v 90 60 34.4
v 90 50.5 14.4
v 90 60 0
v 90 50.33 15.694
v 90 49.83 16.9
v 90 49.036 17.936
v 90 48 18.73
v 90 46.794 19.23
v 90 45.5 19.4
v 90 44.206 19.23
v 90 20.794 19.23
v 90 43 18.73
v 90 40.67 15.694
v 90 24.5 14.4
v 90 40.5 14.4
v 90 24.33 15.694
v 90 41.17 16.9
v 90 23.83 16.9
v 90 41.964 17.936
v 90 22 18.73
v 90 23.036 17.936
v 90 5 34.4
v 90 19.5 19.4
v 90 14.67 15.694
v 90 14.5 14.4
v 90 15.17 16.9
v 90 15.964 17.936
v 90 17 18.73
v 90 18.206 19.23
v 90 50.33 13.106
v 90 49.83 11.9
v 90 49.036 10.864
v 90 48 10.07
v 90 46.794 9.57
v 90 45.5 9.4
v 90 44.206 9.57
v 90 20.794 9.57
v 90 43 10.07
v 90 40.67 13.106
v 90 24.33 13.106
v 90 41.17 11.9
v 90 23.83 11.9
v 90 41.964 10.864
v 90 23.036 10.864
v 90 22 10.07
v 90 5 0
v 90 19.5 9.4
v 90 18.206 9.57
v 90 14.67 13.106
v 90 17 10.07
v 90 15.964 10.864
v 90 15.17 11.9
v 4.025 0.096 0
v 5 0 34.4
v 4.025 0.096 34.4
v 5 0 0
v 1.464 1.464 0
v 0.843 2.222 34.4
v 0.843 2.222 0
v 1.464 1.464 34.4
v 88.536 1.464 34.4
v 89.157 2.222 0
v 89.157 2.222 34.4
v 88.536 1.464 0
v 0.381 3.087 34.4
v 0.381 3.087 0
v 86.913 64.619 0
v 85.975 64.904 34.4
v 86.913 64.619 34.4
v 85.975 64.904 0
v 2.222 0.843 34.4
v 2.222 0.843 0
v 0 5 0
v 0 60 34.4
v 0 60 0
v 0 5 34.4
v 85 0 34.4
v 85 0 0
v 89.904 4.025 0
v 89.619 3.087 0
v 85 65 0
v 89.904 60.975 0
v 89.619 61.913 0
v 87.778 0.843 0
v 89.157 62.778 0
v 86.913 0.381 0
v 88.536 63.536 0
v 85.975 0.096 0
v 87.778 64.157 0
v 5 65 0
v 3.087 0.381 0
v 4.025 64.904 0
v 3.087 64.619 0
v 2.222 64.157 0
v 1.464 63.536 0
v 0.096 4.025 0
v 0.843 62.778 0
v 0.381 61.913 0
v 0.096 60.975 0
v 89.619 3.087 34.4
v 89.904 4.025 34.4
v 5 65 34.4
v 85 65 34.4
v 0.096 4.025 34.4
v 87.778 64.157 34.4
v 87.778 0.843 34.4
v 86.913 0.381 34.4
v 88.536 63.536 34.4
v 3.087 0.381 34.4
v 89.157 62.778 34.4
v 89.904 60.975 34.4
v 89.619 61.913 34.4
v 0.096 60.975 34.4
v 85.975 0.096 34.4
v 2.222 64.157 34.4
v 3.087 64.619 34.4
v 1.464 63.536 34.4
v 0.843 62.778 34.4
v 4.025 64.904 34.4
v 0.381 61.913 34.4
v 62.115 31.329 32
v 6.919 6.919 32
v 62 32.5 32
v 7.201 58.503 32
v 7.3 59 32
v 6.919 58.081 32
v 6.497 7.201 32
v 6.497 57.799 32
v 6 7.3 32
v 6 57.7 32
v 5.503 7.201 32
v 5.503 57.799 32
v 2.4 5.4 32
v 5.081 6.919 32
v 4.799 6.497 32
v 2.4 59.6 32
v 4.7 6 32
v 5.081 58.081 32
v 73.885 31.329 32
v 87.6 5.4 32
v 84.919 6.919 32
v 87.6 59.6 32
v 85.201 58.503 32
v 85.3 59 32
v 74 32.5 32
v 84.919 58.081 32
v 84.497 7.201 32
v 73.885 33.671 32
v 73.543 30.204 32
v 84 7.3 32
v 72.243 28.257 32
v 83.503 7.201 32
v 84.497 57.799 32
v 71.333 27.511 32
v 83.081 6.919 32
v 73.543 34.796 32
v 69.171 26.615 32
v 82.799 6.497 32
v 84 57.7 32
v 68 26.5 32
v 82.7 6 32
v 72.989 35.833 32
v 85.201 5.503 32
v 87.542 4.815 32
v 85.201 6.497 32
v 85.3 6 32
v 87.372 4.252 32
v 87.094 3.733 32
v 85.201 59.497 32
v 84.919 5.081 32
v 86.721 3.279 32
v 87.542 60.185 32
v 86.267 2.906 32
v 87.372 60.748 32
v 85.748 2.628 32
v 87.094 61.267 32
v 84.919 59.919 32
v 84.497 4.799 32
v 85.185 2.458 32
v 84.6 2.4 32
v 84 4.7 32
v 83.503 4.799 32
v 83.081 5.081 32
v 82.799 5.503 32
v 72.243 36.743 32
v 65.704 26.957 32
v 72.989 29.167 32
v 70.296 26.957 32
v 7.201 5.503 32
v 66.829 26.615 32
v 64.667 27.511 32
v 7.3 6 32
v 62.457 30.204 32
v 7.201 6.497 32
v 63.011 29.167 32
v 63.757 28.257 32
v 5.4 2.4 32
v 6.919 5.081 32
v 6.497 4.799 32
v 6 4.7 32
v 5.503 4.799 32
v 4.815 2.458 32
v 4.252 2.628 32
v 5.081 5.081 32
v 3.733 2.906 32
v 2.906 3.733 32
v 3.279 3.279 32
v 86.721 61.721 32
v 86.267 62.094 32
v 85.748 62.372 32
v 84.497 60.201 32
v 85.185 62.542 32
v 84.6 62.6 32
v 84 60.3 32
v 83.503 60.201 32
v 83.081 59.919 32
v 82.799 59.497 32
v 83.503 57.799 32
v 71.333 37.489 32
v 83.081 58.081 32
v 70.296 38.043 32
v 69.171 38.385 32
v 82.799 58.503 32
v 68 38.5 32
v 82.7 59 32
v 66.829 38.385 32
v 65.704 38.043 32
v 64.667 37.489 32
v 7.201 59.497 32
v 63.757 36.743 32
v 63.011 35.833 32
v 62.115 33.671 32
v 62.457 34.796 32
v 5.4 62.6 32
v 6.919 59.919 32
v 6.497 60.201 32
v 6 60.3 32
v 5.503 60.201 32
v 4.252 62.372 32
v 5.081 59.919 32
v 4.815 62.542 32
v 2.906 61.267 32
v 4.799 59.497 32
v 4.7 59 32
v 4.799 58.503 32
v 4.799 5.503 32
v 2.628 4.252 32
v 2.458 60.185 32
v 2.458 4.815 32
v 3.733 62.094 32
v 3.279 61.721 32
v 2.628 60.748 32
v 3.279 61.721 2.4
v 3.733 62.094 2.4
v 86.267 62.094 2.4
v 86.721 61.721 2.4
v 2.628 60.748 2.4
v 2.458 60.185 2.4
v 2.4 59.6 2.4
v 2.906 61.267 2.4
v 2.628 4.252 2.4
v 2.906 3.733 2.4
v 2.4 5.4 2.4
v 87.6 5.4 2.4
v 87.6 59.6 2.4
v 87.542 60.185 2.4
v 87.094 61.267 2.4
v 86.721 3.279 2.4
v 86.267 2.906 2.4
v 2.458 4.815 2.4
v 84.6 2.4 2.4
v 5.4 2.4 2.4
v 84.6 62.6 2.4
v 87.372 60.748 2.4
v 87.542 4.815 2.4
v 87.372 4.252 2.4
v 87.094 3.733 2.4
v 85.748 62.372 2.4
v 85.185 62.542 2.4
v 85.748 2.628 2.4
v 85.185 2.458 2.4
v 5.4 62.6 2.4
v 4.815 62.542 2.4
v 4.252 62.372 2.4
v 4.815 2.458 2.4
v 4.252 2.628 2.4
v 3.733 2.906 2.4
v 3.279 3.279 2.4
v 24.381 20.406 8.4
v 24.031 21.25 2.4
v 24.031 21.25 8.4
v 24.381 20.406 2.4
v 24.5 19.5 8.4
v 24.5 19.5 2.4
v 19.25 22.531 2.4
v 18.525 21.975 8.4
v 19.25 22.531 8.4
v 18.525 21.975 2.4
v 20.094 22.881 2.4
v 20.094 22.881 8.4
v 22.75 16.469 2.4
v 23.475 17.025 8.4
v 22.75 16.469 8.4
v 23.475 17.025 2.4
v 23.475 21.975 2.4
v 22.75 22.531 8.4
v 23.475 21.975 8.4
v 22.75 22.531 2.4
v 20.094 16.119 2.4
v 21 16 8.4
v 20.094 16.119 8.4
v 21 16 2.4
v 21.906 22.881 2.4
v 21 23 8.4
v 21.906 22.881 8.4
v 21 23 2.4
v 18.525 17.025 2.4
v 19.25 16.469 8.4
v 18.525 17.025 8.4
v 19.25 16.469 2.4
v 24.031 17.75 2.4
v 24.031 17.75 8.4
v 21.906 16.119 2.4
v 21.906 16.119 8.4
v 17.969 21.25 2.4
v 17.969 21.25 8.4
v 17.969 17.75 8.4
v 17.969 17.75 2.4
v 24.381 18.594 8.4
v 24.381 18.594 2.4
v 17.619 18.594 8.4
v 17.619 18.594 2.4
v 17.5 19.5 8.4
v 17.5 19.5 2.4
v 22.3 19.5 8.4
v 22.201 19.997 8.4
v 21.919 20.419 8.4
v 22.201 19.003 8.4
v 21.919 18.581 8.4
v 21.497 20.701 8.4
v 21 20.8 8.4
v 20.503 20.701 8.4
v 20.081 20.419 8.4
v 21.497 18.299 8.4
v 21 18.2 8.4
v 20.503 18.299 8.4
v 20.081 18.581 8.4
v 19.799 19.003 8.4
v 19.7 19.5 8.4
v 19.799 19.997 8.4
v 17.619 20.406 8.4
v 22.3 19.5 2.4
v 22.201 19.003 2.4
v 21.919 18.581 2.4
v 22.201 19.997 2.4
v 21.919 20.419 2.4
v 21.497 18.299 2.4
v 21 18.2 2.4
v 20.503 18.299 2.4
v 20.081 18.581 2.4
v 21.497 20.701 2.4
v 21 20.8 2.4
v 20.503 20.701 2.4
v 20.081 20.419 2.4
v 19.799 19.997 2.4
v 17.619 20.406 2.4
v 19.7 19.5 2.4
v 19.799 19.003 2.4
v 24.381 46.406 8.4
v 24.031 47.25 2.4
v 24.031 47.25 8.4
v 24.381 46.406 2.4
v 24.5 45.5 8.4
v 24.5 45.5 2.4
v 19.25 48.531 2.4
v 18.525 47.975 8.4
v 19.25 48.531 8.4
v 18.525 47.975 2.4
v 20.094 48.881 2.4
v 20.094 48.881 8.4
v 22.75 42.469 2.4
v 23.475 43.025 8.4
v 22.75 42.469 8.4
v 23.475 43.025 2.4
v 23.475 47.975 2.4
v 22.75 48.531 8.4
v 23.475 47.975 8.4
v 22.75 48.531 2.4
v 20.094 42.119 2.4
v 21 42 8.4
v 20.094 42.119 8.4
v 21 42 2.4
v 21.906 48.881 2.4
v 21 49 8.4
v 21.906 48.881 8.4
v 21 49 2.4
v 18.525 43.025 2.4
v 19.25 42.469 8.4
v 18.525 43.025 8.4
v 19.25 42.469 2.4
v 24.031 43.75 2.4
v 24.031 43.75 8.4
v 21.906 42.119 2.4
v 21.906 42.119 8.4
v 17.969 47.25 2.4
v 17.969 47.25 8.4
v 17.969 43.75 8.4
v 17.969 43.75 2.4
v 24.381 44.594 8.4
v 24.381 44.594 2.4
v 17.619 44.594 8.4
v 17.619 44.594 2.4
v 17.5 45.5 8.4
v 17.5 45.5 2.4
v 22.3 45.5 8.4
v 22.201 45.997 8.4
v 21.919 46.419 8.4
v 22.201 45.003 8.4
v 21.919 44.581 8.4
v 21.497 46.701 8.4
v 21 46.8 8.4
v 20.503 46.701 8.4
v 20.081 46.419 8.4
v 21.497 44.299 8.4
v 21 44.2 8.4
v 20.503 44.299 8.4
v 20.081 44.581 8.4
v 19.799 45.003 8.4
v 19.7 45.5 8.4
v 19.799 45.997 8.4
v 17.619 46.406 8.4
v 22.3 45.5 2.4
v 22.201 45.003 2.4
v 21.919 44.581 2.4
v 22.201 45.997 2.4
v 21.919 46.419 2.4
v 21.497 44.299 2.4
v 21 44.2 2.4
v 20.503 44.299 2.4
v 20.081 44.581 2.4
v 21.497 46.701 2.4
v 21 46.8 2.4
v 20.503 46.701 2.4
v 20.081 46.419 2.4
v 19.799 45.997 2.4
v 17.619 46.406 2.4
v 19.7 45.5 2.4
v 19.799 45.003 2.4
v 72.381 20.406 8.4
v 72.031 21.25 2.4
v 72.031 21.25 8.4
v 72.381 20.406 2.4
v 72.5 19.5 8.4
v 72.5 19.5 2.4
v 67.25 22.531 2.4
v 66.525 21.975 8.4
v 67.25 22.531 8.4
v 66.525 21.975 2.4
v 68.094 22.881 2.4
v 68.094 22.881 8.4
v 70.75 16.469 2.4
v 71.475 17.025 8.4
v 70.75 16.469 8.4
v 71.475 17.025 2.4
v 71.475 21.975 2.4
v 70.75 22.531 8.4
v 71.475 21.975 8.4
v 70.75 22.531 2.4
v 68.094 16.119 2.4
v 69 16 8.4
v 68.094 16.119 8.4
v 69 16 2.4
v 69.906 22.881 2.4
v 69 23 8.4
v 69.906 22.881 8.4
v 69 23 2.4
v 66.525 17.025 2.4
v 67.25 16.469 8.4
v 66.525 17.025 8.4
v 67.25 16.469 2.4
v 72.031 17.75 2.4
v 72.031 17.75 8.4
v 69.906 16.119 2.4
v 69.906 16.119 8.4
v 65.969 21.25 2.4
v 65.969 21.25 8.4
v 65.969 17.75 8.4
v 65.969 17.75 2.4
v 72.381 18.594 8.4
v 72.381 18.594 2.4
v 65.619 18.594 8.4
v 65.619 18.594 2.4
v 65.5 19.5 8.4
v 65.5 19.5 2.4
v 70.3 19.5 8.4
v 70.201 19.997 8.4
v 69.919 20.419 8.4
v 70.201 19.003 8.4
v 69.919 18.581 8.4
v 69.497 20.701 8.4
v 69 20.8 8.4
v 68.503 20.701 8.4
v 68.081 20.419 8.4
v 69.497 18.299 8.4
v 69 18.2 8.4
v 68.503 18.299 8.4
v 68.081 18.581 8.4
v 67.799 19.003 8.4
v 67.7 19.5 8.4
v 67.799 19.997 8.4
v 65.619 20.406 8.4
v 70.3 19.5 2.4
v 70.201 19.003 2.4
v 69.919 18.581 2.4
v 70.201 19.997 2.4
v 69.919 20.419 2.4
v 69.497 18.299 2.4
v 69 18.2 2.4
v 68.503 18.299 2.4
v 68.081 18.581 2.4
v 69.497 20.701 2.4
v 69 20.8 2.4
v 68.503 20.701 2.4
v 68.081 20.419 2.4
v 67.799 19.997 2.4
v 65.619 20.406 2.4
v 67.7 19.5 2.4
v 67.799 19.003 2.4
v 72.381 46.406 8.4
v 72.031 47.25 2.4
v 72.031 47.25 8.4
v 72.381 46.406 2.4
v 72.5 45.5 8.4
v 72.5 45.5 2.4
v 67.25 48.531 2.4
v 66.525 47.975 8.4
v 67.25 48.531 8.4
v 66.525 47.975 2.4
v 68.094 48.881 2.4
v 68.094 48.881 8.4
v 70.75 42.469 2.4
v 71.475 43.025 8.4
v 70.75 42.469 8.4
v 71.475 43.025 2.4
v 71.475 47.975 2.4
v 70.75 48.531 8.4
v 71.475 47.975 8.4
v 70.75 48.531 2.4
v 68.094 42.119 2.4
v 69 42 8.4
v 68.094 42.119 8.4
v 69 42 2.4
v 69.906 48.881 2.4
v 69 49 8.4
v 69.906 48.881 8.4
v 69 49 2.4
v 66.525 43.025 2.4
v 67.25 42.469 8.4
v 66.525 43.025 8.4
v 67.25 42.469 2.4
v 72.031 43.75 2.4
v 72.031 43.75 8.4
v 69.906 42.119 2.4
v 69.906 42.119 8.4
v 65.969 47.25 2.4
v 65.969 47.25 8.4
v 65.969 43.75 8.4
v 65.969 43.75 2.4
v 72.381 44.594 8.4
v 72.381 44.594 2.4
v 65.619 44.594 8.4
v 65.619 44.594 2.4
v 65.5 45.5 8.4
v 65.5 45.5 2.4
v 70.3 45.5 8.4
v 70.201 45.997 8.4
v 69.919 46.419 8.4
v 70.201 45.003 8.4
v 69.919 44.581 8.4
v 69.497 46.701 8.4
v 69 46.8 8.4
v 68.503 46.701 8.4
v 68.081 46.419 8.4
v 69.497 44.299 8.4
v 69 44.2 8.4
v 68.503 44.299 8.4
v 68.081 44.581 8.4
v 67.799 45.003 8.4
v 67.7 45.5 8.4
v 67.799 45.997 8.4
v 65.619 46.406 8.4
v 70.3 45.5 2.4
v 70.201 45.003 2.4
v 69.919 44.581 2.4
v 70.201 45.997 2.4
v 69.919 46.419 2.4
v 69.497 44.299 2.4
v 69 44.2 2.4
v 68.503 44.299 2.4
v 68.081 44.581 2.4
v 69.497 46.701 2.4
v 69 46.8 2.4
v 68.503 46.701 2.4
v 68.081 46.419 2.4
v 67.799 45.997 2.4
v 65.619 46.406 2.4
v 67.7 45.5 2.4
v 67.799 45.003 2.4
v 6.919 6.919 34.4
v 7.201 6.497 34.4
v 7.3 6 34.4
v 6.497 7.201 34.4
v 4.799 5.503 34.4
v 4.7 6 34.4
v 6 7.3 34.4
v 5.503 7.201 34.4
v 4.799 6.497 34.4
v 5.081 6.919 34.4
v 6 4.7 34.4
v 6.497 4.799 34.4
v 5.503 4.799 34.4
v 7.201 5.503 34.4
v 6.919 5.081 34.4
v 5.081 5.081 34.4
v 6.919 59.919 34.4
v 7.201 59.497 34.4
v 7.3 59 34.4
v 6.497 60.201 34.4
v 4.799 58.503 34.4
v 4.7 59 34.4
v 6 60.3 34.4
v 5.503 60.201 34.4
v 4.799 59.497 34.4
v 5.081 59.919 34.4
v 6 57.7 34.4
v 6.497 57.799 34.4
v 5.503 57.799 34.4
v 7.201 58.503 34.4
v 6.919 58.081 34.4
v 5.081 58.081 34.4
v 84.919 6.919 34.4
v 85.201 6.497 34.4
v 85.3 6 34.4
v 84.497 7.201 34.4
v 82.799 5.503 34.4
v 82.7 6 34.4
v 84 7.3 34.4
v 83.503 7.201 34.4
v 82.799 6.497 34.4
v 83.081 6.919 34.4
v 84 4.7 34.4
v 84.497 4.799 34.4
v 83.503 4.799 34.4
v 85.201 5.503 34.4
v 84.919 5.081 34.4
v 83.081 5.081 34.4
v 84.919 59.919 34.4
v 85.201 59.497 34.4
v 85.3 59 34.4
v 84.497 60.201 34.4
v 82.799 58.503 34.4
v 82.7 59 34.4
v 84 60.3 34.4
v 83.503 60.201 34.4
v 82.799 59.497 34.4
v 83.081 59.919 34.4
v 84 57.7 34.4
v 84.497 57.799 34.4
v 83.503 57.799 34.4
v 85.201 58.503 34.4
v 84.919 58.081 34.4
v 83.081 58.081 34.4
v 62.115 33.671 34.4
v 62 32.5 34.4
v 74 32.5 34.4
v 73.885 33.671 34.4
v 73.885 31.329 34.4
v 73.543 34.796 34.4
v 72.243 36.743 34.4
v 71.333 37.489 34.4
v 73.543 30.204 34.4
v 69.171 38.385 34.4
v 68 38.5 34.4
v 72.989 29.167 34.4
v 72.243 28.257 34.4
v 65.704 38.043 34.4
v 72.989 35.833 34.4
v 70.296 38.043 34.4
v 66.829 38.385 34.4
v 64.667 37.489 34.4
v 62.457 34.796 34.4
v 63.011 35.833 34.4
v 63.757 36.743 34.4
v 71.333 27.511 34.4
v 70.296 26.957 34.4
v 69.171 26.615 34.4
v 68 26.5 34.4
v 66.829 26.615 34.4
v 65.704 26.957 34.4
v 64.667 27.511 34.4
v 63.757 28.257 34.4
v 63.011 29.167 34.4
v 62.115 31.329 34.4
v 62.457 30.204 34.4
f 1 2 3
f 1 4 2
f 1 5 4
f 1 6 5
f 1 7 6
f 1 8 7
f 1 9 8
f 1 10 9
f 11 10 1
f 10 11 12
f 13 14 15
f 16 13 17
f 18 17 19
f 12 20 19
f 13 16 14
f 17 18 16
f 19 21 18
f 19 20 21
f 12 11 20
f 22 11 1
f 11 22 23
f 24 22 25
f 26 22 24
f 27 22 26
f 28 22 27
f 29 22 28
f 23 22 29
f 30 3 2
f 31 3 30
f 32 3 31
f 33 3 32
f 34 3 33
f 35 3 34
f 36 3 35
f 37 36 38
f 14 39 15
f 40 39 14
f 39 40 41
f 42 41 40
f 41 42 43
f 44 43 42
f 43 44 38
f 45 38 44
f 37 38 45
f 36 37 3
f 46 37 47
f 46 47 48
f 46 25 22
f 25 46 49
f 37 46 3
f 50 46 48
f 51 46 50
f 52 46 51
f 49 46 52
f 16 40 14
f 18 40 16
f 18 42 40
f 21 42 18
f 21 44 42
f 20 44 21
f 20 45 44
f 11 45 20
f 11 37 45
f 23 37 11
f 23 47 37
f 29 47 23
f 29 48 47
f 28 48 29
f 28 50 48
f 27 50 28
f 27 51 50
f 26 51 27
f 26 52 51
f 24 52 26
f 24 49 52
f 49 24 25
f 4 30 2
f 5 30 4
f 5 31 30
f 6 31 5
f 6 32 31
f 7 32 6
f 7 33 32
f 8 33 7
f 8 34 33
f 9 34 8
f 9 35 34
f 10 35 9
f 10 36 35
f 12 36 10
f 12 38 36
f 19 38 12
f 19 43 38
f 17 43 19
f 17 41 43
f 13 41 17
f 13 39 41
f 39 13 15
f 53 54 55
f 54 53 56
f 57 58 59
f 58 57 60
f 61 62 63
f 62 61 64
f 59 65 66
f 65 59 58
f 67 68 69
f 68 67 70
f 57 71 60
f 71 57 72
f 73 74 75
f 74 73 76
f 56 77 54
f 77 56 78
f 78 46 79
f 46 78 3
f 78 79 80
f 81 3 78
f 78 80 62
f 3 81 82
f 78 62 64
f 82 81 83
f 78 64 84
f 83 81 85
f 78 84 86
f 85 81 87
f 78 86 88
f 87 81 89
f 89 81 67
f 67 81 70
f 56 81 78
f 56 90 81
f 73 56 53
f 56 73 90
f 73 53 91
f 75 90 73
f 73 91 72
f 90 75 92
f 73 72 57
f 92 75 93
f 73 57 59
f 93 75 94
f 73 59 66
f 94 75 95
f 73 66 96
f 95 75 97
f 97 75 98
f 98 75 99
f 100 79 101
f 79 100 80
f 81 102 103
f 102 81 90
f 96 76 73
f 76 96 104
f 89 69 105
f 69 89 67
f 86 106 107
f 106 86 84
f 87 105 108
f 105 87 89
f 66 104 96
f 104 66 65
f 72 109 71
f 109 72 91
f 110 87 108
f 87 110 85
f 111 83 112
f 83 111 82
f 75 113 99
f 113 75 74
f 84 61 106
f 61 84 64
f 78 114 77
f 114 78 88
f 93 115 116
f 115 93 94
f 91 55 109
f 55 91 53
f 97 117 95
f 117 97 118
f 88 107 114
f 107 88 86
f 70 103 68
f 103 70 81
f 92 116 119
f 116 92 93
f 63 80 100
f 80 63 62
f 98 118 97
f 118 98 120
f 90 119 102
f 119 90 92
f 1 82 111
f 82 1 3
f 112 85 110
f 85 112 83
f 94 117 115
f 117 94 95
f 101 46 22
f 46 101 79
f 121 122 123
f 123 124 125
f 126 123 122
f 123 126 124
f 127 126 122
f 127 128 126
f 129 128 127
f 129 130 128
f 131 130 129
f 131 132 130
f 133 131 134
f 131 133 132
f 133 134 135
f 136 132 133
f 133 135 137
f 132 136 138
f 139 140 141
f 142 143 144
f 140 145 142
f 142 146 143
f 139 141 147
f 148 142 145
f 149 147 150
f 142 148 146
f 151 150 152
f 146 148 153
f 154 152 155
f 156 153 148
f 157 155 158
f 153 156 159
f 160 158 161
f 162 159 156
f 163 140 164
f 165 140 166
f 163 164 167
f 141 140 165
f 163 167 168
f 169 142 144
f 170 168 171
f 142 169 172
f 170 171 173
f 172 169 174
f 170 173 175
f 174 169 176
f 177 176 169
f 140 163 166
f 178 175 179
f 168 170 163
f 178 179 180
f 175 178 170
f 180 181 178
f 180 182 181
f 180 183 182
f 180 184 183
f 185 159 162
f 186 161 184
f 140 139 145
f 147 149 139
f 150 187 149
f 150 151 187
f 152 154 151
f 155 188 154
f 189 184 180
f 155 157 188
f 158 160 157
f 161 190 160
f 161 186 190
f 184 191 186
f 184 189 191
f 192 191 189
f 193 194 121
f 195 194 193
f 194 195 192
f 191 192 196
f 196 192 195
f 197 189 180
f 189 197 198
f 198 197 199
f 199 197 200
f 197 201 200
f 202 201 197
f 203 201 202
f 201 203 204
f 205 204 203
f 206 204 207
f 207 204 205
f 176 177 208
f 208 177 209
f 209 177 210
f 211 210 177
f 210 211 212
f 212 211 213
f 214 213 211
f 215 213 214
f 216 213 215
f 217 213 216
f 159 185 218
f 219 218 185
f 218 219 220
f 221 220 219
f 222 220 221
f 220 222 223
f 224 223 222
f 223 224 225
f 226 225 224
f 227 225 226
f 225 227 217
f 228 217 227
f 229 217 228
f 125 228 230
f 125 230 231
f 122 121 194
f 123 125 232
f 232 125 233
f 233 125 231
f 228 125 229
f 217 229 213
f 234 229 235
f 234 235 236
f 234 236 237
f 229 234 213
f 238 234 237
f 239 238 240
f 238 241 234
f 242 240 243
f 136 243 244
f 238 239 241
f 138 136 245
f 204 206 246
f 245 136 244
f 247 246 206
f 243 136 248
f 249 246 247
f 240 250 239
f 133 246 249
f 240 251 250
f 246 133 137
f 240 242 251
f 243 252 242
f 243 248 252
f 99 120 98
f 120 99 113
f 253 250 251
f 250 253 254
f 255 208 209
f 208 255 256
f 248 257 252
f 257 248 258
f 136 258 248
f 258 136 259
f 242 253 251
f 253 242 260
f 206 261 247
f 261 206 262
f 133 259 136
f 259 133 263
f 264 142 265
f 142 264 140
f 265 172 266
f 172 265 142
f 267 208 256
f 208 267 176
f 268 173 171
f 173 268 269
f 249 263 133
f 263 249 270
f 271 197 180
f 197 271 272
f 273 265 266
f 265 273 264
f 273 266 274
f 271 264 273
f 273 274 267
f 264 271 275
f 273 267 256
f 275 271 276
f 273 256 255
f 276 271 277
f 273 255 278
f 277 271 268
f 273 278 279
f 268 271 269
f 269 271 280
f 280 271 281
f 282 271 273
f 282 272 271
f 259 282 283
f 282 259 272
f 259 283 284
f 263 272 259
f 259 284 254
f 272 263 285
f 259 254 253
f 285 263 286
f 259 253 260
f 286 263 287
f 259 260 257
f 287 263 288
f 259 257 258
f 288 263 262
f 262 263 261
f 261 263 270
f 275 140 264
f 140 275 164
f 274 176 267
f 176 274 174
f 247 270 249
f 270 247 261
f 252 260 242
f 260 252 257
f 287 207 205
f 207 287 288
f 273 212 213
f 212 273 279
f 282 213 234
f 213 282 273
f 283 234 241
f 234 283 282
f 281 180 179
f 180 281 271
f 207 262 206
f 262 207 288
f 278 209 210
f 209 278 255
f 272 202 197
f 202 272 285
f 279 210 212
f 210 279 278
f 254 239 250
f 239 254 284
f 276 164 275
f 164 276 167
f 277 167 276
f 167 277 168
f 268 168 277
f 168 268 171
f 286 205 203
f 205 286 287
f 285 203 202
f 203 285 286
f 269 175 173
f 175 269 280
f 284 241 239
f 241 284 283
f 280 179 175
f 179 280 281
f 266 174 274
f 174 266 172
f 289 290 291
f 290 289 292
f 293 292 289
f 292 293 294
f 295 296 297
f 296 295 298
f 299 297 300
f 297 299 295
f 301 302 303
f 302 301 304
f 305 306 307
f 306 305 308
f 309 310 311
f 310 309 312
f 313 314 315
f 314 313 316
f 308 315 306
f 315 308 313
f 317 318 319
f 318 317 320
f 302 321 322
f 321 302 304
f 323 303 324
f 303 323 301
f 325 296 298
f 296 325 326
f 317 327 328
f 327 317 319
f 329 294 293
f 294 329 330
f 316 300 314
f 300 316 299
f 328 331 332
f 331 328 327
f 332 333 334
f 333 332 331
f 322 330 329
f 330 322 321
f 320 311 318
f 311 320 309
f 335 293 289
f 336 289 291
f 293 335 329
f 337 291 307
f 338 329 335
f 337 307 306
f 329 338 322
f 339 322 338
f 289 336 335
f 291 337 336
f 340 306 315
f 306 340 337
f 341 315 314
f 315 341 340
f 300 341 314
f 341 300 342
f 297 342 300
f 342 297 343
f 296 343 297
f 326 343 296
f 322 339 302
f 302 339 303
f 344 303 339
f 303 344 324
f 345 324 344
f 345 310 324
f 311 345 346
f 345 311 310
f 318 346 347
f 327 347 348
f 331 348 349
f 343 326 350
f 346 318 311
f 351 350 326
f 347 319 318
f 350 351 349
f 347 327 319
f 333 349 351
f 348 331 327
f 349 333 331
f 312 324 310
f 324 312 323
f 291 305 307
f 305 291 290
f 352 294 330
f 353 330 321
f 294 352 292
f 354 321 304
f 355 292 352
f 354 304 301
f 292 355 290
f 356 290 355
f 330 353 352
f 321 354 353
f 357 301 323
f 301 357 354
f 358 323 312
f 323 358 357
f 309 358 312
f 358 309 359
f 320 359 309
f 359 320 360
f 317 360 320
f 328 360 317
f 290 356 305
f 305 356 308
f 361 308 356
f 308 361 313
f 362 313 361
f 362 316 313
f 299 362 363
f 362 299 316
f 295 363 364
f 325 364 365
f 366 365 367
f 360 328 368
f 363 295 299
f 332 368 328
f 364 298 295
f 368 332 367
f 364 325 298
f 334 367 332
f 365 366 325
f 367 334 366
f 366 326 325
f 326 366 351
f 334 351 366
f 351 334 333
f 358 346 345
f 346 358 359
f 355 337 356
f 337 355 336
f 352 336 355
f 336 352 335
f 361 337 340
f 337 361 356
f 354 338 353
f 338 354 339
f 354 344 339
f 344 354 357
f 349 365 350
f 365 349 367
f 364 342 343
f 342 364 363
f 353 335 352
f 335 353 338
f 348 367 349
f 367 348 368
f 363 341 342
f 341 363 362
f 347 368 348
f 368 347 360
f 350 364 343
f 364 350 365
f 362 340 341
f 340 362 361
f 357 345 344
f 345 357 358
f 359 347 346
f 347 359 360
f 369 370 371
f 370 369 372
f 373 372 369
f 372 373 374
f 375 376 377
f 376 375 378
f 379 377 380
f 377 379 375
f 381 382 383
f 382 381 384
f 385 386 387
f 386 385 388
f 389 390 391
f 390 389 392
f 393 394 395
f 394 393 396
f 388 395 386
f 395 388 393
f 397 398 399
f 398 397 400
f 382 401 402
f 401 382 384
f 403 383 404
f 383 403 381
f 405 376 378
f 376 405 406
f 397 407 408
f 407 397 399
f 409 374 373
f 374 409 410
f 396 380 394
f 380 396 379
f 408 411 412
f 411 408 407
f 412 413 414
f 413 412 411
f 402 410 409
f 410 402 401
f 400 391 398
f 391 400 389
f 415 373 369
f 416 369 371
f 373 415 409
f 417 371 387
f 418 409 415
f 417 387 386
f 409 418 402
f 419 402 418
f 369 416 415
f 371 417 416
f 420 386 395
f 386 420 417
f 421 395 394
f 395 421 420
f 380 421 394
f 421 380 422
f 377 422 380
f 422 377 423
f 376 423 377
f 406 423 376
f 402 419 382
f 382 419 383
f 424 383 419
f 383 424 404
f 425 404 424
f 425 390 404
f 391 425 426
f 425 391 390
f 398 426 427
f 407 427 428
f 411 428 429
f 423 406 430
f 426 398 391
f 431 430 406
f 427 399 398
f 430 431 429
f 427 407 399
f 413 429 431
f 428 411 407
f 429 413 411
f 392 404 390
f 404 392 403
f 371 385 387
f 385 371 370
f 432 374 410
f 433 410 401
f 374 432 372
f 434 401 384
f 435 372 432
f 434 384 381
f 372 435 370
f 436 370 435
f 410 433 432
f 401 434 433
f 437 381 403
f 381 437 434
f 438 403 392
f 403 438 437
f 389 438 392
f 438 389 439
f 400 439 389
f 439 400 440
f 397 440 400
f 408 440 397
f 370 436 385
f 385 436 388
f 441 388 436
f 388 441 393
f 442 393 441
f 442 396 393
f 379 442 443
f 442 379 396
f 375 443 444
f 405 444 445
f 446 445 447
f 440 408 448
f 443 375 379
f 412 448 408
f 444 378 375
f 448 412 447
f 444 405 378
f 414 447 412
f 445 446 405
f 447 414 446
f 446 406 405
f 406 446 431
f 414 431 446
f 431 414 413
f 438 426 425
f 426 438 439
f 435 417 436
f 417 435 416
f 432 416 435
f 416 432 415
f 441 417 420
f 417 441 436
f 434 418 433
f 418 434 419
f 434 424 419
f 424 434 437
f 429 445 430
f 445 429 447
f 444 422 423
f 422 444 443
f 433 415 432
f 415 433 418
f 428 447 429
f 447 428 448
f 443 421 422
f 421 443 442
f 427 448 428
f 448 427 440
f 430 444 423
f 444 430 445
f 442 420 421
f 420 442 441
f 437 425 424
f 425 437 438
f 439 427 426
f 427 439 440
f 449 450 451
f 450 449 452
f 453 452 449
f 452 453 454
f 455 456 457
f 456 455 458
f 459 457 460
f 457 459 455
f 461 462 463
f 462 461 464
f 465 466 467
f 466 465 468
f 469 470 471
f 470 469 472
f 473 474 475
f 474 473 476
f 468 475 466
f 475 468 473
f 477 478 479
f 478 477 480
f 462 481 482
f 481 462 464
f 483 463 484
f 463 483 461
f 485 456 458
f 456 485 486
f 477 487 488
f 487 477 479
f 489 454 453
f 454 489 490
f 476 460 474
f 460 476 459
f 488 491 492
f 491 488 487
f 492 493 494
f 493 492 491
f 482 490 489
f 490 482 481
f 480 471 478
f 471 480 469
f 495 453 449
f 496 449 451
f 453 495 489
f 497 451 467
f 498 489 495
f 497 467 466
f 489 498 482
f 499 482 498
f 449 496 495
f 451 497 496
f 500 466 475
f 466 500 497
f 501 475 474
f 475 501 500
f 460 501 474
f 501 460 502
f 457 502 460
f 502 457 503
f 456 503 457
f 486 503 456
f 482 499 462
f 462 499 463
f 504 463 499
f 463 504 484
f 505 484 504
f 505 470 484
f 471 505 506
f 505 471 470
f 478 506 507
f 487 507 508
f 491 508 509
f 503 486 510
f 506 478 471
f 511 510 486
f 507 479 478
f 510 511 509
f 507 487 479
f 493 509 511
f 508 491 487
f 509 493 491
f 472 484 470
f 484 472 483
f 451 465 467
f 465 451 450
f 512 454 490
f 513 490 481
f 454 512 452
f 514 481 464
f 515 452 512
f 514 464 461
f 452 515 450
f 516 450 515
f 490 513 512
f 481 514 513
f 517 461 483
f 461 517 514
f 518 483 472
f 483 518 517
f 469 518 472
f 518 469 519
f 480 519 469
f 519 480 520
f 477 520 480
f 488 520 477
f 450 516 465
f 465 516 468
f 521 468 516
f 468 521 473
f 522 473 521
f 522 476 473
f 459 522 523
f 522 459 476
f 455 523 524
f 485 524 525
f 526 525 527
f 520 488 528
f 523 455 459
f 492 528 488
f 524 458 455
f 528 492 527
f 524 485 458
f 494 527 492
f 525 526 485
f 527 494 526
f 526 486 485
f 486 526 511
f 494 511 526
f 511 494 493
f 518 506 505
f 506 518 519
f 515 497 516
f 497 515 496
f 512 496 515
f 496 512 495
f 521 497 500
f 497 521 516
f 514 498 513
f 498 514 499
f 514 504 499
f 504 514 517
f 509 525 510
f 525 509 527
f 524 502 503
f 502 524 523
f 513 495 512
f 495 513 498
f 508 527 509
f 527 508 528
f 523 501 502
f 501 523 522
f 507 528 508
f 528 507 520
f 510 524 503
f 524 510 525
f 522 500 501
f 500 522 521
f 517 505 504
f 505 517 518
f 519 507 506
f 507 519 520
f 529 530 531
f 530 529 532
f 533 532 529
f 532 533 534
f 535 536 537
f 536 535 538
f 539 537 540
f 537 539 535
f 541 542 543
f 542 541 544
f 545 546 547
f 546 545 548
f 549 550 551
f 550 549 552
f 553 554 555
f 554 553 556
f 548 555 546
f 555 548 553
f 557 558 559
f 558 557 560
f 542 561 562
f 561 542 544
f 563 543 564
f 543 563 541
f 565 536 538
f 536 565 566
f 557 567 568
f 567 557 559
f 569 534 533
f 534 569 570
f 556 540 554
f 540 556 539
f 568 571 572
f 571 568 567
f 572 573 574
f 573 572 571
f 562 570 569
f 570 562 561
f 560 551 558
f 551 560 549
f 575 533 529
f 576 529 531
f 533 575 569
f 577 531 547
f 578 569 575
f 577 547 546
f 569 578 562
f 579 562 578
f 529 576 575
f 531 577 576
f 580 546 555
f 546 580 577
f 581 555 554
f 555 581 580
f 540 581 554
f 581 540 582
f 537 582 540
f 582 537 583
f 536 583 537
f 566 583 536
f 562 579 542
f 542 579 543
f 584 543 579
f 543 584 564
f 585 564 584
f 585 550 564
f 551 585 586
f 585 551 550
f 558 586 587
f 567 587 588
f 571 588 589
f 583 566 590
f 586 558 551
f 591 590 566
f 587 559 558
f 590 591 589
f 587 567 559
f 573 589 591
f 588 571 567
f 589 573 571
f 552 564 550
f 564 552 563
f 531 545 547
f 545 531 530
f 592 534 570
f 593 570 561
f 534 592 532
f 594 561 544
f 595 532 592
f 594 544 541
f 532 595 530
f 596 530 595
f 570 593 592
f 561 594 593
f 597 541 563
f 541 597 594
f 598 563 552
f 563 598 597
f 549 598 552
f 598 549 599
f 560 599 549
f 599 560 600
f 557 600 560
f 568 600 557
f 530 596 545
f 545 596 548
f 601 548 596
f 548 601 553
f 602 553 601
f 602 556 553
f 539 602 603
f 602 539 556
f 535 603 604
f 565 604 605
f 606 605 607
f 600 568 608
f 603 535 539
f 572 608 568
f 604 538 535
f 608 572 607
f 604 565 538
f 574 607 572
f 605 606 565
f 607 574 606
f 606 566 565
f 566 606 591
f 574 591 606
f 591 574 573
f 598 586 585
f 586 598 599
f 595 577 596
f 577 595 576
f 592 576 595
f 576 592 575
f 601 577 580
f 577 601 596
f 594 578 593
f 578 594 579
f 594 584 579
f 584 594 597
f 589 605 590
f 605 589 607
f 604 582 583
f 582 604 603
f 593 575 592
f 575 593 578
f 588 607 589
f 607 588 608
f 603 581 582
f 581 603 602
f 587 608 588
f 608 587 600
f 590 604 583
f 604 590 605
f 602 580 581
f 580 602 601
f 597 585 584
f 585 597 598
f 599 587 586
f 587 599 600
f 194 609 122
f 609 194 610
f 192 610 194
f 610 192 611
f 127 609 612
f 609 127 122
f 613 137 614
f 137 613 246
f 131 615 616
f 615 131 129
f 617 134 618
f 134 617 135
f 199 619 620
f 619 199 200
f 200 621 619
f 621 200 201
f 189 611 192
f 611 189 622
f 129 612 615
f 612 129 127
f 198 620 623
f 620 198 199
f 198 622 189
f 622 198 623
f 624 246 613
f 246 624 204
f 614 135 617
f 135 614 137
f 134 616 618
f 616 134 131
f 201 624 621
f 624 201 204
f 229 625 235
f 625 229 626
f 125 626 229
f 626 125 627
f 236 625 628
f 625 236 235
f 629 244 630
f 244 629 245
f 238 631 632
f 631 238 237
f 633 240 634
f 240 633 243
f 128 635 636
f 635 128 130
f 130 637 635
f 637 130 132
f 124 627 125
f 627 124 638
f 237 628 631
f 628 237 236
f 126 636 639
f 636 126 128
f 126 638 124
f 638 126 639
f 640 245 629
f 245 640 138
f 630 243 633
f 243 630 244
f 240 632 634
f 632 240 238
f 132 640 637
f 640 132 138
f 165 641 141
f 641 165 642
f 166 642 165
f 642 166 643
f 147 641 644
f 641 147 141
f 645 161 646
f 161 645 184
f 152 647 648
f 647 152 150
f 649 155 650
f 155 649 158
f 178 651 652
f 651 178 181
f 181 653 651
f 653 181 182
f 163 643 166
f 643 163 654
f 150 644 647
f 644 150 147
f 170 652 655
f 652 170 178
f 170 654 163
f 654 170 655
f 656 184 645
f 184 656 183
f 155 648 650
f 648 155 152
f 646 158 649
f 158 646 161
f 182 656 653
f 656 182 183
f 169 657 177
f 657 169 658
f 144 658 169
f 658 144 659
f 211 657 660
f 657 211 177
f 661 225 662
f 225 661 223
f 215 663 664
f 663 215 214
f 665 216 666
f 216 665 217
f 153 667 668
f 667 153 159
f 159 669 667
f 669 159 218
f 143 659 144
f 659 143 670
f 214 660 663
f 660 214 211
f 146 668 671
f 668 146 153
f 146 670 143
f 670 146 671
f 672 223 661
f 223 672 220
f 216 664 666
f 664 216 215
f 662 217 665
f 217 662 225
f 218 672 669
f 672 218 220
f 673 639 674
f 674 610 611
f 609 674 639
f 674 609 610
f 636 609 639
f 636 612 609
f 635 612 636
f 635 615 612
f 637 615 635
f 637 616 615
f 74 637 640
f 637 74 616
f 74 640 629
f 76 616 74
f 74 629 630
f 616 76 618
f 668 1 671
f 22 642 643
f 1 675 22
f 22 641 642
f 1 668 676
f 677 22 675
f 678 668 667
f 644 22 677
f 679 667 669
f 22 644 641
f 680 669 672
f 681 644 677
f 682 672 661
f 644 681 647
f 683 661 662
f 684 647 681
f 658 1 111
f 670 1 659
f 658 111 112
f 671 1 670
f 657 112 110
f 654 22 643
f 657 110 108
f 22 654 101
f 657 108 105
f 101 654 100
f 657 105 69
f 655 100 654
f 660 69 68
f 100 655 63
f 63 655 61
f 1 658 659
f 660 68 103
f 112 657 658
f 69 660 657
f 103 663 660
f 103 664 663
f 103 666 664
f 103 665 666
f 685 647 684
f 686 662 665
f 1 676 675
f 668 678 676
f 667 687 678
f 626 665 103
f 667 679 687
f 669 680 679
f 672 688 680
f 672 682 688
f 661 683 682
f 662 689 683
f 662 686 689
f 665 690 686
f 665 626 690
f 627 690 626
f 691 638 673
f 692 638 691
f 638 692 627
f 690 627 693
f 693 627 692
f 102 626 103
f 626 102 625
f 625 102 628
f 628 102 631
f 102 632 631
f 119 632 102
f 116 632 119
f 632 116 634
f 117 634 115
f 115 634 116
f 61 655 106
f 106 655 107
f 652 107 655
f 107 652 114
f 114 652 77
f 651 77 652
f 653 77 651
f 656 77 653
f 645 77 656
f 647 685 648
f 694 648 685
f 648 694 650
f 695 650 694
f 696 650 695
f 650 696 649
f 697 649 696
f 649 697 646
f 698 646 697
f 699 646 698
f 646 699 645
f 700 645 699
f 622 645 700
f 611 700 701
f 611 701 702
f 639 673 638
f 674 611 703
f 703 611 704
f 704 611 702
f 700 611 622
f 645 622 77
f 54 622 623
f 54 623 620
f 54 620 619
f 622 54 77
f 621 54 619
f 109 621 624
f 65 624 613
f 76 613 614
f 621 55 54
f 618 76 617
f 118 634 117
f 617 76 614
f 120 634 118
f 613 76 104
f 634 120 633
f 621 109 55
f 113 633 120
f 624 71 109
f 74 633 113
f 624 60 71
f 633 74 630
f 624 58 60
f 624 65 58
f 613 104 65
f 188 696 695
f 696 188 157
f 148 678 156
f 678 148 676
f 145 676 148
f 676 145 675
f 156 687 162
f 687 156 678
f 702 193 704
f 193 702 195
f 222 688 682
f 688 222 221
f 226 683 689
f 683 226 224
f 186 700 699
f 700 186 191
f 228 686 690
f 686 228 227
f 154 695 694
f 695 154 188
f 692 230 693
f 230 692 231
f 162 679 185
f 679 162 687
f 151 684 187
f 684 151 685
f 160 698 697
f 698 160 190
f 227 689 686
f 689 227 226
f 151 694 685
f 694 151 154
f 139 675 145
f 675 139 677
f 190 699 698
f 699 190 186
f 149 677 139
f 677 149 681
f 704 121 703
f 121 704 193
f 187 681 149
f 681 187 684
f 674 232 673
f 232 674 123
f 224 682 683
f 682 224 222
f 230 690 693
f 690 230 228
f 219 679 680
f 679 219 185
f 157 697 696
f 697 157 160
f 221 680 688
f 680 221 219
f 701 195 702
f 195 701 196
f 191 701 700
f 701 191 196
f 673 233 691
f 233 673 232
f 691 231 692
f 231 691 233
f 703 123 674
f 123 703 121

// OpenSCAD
// Enclosure for the ESP32 mobile data mule node.
// Units: mm. Render with OpenSCAD (https://openscad.org).
//
// Print settings: PLA/PETG, 0.2 mm layer height, 20% infill.
// The lid is a separate part so the SD card and USB port remain accessible.

/* [Dimensions] */
outer_x      = 90;
outer_y      = 65;
outer_z      = 32;
wall         = 2.4;
floor_thick  = 2.4;
lid_thick    = 2.4;

/* [Mounting] */
boss_d       = 7;
boss_h       = 6;
screw_d      = 2.6;
board_hole_x = 24;   // half-pitch of DevKit mounting holes
board_hole_y = 13;

/* [Render switches] */
show_base = true;
show_lid  = true;

module rounded_box(sx, sy, sz, r) {
    hull() {
        for (x = [r, sx - r], y = [r, sy - r])
            translate([x, y, 0]) cylinder(r = r, h = sz, $fn = 32);
    }
}

module base() {
    difference() {
        rounded_box(outer_x, outer_y, outer_z, 5);
        // hollow interior
        translate([wall, wall, floor_thick])
            rounded_box(outer_x - 2 * wall, outer_y - 2 * wall,
                        outer_z, 3);
        // PCB mounting bosses are added back below
        // cable gland holes on the long wall
        for (y = [outer_y * 0.3, outer_y * 0.7])
            translate([outer_x, y, outer_z * 0.45])
                rotate([0, 90, 0])
                    cylinder(r = 5, h = wall + 2, $fn = 24);
    }

    // mounting bosses for the ESP32 DevKit
    for (dx = [-board_hole_x, board_hole_x],
         dy = [-board_hole_y, board_hole_y])
        translate([outer_x / 2 + dx, outer_y / 2 + dy, floor_thick])
            difference() {
                cylinder(r = boss_d / 2, h = boss_h, $fn = 24);
                cylinder(r = screw_d / 2, h = boss_h + 1, $fn = 16);
            }
}

module lid() {
    difference() {
        translate([0, 0, outer_z])
            rounded_box(outer_x, outer_y, lid_thick, 5);
        // lightening cut-out for status LED / OLED window
        translate([outer_x - 22, outer_y / 2, outer_z - 1])
            cylinder(r = 6, h = lid_thick + 2, $fn = 32);
        // corner screw holes
        for (x = [6, outer_x - 6], y = [6, outer_y - 6])
            translate([x, y, outer_z - 1])
                cylinder(r = screw_d / 2, h = lid_thick + 2, $fn = 16);
    }
}

if (show_base) base();
if (show_lid)  lid();
